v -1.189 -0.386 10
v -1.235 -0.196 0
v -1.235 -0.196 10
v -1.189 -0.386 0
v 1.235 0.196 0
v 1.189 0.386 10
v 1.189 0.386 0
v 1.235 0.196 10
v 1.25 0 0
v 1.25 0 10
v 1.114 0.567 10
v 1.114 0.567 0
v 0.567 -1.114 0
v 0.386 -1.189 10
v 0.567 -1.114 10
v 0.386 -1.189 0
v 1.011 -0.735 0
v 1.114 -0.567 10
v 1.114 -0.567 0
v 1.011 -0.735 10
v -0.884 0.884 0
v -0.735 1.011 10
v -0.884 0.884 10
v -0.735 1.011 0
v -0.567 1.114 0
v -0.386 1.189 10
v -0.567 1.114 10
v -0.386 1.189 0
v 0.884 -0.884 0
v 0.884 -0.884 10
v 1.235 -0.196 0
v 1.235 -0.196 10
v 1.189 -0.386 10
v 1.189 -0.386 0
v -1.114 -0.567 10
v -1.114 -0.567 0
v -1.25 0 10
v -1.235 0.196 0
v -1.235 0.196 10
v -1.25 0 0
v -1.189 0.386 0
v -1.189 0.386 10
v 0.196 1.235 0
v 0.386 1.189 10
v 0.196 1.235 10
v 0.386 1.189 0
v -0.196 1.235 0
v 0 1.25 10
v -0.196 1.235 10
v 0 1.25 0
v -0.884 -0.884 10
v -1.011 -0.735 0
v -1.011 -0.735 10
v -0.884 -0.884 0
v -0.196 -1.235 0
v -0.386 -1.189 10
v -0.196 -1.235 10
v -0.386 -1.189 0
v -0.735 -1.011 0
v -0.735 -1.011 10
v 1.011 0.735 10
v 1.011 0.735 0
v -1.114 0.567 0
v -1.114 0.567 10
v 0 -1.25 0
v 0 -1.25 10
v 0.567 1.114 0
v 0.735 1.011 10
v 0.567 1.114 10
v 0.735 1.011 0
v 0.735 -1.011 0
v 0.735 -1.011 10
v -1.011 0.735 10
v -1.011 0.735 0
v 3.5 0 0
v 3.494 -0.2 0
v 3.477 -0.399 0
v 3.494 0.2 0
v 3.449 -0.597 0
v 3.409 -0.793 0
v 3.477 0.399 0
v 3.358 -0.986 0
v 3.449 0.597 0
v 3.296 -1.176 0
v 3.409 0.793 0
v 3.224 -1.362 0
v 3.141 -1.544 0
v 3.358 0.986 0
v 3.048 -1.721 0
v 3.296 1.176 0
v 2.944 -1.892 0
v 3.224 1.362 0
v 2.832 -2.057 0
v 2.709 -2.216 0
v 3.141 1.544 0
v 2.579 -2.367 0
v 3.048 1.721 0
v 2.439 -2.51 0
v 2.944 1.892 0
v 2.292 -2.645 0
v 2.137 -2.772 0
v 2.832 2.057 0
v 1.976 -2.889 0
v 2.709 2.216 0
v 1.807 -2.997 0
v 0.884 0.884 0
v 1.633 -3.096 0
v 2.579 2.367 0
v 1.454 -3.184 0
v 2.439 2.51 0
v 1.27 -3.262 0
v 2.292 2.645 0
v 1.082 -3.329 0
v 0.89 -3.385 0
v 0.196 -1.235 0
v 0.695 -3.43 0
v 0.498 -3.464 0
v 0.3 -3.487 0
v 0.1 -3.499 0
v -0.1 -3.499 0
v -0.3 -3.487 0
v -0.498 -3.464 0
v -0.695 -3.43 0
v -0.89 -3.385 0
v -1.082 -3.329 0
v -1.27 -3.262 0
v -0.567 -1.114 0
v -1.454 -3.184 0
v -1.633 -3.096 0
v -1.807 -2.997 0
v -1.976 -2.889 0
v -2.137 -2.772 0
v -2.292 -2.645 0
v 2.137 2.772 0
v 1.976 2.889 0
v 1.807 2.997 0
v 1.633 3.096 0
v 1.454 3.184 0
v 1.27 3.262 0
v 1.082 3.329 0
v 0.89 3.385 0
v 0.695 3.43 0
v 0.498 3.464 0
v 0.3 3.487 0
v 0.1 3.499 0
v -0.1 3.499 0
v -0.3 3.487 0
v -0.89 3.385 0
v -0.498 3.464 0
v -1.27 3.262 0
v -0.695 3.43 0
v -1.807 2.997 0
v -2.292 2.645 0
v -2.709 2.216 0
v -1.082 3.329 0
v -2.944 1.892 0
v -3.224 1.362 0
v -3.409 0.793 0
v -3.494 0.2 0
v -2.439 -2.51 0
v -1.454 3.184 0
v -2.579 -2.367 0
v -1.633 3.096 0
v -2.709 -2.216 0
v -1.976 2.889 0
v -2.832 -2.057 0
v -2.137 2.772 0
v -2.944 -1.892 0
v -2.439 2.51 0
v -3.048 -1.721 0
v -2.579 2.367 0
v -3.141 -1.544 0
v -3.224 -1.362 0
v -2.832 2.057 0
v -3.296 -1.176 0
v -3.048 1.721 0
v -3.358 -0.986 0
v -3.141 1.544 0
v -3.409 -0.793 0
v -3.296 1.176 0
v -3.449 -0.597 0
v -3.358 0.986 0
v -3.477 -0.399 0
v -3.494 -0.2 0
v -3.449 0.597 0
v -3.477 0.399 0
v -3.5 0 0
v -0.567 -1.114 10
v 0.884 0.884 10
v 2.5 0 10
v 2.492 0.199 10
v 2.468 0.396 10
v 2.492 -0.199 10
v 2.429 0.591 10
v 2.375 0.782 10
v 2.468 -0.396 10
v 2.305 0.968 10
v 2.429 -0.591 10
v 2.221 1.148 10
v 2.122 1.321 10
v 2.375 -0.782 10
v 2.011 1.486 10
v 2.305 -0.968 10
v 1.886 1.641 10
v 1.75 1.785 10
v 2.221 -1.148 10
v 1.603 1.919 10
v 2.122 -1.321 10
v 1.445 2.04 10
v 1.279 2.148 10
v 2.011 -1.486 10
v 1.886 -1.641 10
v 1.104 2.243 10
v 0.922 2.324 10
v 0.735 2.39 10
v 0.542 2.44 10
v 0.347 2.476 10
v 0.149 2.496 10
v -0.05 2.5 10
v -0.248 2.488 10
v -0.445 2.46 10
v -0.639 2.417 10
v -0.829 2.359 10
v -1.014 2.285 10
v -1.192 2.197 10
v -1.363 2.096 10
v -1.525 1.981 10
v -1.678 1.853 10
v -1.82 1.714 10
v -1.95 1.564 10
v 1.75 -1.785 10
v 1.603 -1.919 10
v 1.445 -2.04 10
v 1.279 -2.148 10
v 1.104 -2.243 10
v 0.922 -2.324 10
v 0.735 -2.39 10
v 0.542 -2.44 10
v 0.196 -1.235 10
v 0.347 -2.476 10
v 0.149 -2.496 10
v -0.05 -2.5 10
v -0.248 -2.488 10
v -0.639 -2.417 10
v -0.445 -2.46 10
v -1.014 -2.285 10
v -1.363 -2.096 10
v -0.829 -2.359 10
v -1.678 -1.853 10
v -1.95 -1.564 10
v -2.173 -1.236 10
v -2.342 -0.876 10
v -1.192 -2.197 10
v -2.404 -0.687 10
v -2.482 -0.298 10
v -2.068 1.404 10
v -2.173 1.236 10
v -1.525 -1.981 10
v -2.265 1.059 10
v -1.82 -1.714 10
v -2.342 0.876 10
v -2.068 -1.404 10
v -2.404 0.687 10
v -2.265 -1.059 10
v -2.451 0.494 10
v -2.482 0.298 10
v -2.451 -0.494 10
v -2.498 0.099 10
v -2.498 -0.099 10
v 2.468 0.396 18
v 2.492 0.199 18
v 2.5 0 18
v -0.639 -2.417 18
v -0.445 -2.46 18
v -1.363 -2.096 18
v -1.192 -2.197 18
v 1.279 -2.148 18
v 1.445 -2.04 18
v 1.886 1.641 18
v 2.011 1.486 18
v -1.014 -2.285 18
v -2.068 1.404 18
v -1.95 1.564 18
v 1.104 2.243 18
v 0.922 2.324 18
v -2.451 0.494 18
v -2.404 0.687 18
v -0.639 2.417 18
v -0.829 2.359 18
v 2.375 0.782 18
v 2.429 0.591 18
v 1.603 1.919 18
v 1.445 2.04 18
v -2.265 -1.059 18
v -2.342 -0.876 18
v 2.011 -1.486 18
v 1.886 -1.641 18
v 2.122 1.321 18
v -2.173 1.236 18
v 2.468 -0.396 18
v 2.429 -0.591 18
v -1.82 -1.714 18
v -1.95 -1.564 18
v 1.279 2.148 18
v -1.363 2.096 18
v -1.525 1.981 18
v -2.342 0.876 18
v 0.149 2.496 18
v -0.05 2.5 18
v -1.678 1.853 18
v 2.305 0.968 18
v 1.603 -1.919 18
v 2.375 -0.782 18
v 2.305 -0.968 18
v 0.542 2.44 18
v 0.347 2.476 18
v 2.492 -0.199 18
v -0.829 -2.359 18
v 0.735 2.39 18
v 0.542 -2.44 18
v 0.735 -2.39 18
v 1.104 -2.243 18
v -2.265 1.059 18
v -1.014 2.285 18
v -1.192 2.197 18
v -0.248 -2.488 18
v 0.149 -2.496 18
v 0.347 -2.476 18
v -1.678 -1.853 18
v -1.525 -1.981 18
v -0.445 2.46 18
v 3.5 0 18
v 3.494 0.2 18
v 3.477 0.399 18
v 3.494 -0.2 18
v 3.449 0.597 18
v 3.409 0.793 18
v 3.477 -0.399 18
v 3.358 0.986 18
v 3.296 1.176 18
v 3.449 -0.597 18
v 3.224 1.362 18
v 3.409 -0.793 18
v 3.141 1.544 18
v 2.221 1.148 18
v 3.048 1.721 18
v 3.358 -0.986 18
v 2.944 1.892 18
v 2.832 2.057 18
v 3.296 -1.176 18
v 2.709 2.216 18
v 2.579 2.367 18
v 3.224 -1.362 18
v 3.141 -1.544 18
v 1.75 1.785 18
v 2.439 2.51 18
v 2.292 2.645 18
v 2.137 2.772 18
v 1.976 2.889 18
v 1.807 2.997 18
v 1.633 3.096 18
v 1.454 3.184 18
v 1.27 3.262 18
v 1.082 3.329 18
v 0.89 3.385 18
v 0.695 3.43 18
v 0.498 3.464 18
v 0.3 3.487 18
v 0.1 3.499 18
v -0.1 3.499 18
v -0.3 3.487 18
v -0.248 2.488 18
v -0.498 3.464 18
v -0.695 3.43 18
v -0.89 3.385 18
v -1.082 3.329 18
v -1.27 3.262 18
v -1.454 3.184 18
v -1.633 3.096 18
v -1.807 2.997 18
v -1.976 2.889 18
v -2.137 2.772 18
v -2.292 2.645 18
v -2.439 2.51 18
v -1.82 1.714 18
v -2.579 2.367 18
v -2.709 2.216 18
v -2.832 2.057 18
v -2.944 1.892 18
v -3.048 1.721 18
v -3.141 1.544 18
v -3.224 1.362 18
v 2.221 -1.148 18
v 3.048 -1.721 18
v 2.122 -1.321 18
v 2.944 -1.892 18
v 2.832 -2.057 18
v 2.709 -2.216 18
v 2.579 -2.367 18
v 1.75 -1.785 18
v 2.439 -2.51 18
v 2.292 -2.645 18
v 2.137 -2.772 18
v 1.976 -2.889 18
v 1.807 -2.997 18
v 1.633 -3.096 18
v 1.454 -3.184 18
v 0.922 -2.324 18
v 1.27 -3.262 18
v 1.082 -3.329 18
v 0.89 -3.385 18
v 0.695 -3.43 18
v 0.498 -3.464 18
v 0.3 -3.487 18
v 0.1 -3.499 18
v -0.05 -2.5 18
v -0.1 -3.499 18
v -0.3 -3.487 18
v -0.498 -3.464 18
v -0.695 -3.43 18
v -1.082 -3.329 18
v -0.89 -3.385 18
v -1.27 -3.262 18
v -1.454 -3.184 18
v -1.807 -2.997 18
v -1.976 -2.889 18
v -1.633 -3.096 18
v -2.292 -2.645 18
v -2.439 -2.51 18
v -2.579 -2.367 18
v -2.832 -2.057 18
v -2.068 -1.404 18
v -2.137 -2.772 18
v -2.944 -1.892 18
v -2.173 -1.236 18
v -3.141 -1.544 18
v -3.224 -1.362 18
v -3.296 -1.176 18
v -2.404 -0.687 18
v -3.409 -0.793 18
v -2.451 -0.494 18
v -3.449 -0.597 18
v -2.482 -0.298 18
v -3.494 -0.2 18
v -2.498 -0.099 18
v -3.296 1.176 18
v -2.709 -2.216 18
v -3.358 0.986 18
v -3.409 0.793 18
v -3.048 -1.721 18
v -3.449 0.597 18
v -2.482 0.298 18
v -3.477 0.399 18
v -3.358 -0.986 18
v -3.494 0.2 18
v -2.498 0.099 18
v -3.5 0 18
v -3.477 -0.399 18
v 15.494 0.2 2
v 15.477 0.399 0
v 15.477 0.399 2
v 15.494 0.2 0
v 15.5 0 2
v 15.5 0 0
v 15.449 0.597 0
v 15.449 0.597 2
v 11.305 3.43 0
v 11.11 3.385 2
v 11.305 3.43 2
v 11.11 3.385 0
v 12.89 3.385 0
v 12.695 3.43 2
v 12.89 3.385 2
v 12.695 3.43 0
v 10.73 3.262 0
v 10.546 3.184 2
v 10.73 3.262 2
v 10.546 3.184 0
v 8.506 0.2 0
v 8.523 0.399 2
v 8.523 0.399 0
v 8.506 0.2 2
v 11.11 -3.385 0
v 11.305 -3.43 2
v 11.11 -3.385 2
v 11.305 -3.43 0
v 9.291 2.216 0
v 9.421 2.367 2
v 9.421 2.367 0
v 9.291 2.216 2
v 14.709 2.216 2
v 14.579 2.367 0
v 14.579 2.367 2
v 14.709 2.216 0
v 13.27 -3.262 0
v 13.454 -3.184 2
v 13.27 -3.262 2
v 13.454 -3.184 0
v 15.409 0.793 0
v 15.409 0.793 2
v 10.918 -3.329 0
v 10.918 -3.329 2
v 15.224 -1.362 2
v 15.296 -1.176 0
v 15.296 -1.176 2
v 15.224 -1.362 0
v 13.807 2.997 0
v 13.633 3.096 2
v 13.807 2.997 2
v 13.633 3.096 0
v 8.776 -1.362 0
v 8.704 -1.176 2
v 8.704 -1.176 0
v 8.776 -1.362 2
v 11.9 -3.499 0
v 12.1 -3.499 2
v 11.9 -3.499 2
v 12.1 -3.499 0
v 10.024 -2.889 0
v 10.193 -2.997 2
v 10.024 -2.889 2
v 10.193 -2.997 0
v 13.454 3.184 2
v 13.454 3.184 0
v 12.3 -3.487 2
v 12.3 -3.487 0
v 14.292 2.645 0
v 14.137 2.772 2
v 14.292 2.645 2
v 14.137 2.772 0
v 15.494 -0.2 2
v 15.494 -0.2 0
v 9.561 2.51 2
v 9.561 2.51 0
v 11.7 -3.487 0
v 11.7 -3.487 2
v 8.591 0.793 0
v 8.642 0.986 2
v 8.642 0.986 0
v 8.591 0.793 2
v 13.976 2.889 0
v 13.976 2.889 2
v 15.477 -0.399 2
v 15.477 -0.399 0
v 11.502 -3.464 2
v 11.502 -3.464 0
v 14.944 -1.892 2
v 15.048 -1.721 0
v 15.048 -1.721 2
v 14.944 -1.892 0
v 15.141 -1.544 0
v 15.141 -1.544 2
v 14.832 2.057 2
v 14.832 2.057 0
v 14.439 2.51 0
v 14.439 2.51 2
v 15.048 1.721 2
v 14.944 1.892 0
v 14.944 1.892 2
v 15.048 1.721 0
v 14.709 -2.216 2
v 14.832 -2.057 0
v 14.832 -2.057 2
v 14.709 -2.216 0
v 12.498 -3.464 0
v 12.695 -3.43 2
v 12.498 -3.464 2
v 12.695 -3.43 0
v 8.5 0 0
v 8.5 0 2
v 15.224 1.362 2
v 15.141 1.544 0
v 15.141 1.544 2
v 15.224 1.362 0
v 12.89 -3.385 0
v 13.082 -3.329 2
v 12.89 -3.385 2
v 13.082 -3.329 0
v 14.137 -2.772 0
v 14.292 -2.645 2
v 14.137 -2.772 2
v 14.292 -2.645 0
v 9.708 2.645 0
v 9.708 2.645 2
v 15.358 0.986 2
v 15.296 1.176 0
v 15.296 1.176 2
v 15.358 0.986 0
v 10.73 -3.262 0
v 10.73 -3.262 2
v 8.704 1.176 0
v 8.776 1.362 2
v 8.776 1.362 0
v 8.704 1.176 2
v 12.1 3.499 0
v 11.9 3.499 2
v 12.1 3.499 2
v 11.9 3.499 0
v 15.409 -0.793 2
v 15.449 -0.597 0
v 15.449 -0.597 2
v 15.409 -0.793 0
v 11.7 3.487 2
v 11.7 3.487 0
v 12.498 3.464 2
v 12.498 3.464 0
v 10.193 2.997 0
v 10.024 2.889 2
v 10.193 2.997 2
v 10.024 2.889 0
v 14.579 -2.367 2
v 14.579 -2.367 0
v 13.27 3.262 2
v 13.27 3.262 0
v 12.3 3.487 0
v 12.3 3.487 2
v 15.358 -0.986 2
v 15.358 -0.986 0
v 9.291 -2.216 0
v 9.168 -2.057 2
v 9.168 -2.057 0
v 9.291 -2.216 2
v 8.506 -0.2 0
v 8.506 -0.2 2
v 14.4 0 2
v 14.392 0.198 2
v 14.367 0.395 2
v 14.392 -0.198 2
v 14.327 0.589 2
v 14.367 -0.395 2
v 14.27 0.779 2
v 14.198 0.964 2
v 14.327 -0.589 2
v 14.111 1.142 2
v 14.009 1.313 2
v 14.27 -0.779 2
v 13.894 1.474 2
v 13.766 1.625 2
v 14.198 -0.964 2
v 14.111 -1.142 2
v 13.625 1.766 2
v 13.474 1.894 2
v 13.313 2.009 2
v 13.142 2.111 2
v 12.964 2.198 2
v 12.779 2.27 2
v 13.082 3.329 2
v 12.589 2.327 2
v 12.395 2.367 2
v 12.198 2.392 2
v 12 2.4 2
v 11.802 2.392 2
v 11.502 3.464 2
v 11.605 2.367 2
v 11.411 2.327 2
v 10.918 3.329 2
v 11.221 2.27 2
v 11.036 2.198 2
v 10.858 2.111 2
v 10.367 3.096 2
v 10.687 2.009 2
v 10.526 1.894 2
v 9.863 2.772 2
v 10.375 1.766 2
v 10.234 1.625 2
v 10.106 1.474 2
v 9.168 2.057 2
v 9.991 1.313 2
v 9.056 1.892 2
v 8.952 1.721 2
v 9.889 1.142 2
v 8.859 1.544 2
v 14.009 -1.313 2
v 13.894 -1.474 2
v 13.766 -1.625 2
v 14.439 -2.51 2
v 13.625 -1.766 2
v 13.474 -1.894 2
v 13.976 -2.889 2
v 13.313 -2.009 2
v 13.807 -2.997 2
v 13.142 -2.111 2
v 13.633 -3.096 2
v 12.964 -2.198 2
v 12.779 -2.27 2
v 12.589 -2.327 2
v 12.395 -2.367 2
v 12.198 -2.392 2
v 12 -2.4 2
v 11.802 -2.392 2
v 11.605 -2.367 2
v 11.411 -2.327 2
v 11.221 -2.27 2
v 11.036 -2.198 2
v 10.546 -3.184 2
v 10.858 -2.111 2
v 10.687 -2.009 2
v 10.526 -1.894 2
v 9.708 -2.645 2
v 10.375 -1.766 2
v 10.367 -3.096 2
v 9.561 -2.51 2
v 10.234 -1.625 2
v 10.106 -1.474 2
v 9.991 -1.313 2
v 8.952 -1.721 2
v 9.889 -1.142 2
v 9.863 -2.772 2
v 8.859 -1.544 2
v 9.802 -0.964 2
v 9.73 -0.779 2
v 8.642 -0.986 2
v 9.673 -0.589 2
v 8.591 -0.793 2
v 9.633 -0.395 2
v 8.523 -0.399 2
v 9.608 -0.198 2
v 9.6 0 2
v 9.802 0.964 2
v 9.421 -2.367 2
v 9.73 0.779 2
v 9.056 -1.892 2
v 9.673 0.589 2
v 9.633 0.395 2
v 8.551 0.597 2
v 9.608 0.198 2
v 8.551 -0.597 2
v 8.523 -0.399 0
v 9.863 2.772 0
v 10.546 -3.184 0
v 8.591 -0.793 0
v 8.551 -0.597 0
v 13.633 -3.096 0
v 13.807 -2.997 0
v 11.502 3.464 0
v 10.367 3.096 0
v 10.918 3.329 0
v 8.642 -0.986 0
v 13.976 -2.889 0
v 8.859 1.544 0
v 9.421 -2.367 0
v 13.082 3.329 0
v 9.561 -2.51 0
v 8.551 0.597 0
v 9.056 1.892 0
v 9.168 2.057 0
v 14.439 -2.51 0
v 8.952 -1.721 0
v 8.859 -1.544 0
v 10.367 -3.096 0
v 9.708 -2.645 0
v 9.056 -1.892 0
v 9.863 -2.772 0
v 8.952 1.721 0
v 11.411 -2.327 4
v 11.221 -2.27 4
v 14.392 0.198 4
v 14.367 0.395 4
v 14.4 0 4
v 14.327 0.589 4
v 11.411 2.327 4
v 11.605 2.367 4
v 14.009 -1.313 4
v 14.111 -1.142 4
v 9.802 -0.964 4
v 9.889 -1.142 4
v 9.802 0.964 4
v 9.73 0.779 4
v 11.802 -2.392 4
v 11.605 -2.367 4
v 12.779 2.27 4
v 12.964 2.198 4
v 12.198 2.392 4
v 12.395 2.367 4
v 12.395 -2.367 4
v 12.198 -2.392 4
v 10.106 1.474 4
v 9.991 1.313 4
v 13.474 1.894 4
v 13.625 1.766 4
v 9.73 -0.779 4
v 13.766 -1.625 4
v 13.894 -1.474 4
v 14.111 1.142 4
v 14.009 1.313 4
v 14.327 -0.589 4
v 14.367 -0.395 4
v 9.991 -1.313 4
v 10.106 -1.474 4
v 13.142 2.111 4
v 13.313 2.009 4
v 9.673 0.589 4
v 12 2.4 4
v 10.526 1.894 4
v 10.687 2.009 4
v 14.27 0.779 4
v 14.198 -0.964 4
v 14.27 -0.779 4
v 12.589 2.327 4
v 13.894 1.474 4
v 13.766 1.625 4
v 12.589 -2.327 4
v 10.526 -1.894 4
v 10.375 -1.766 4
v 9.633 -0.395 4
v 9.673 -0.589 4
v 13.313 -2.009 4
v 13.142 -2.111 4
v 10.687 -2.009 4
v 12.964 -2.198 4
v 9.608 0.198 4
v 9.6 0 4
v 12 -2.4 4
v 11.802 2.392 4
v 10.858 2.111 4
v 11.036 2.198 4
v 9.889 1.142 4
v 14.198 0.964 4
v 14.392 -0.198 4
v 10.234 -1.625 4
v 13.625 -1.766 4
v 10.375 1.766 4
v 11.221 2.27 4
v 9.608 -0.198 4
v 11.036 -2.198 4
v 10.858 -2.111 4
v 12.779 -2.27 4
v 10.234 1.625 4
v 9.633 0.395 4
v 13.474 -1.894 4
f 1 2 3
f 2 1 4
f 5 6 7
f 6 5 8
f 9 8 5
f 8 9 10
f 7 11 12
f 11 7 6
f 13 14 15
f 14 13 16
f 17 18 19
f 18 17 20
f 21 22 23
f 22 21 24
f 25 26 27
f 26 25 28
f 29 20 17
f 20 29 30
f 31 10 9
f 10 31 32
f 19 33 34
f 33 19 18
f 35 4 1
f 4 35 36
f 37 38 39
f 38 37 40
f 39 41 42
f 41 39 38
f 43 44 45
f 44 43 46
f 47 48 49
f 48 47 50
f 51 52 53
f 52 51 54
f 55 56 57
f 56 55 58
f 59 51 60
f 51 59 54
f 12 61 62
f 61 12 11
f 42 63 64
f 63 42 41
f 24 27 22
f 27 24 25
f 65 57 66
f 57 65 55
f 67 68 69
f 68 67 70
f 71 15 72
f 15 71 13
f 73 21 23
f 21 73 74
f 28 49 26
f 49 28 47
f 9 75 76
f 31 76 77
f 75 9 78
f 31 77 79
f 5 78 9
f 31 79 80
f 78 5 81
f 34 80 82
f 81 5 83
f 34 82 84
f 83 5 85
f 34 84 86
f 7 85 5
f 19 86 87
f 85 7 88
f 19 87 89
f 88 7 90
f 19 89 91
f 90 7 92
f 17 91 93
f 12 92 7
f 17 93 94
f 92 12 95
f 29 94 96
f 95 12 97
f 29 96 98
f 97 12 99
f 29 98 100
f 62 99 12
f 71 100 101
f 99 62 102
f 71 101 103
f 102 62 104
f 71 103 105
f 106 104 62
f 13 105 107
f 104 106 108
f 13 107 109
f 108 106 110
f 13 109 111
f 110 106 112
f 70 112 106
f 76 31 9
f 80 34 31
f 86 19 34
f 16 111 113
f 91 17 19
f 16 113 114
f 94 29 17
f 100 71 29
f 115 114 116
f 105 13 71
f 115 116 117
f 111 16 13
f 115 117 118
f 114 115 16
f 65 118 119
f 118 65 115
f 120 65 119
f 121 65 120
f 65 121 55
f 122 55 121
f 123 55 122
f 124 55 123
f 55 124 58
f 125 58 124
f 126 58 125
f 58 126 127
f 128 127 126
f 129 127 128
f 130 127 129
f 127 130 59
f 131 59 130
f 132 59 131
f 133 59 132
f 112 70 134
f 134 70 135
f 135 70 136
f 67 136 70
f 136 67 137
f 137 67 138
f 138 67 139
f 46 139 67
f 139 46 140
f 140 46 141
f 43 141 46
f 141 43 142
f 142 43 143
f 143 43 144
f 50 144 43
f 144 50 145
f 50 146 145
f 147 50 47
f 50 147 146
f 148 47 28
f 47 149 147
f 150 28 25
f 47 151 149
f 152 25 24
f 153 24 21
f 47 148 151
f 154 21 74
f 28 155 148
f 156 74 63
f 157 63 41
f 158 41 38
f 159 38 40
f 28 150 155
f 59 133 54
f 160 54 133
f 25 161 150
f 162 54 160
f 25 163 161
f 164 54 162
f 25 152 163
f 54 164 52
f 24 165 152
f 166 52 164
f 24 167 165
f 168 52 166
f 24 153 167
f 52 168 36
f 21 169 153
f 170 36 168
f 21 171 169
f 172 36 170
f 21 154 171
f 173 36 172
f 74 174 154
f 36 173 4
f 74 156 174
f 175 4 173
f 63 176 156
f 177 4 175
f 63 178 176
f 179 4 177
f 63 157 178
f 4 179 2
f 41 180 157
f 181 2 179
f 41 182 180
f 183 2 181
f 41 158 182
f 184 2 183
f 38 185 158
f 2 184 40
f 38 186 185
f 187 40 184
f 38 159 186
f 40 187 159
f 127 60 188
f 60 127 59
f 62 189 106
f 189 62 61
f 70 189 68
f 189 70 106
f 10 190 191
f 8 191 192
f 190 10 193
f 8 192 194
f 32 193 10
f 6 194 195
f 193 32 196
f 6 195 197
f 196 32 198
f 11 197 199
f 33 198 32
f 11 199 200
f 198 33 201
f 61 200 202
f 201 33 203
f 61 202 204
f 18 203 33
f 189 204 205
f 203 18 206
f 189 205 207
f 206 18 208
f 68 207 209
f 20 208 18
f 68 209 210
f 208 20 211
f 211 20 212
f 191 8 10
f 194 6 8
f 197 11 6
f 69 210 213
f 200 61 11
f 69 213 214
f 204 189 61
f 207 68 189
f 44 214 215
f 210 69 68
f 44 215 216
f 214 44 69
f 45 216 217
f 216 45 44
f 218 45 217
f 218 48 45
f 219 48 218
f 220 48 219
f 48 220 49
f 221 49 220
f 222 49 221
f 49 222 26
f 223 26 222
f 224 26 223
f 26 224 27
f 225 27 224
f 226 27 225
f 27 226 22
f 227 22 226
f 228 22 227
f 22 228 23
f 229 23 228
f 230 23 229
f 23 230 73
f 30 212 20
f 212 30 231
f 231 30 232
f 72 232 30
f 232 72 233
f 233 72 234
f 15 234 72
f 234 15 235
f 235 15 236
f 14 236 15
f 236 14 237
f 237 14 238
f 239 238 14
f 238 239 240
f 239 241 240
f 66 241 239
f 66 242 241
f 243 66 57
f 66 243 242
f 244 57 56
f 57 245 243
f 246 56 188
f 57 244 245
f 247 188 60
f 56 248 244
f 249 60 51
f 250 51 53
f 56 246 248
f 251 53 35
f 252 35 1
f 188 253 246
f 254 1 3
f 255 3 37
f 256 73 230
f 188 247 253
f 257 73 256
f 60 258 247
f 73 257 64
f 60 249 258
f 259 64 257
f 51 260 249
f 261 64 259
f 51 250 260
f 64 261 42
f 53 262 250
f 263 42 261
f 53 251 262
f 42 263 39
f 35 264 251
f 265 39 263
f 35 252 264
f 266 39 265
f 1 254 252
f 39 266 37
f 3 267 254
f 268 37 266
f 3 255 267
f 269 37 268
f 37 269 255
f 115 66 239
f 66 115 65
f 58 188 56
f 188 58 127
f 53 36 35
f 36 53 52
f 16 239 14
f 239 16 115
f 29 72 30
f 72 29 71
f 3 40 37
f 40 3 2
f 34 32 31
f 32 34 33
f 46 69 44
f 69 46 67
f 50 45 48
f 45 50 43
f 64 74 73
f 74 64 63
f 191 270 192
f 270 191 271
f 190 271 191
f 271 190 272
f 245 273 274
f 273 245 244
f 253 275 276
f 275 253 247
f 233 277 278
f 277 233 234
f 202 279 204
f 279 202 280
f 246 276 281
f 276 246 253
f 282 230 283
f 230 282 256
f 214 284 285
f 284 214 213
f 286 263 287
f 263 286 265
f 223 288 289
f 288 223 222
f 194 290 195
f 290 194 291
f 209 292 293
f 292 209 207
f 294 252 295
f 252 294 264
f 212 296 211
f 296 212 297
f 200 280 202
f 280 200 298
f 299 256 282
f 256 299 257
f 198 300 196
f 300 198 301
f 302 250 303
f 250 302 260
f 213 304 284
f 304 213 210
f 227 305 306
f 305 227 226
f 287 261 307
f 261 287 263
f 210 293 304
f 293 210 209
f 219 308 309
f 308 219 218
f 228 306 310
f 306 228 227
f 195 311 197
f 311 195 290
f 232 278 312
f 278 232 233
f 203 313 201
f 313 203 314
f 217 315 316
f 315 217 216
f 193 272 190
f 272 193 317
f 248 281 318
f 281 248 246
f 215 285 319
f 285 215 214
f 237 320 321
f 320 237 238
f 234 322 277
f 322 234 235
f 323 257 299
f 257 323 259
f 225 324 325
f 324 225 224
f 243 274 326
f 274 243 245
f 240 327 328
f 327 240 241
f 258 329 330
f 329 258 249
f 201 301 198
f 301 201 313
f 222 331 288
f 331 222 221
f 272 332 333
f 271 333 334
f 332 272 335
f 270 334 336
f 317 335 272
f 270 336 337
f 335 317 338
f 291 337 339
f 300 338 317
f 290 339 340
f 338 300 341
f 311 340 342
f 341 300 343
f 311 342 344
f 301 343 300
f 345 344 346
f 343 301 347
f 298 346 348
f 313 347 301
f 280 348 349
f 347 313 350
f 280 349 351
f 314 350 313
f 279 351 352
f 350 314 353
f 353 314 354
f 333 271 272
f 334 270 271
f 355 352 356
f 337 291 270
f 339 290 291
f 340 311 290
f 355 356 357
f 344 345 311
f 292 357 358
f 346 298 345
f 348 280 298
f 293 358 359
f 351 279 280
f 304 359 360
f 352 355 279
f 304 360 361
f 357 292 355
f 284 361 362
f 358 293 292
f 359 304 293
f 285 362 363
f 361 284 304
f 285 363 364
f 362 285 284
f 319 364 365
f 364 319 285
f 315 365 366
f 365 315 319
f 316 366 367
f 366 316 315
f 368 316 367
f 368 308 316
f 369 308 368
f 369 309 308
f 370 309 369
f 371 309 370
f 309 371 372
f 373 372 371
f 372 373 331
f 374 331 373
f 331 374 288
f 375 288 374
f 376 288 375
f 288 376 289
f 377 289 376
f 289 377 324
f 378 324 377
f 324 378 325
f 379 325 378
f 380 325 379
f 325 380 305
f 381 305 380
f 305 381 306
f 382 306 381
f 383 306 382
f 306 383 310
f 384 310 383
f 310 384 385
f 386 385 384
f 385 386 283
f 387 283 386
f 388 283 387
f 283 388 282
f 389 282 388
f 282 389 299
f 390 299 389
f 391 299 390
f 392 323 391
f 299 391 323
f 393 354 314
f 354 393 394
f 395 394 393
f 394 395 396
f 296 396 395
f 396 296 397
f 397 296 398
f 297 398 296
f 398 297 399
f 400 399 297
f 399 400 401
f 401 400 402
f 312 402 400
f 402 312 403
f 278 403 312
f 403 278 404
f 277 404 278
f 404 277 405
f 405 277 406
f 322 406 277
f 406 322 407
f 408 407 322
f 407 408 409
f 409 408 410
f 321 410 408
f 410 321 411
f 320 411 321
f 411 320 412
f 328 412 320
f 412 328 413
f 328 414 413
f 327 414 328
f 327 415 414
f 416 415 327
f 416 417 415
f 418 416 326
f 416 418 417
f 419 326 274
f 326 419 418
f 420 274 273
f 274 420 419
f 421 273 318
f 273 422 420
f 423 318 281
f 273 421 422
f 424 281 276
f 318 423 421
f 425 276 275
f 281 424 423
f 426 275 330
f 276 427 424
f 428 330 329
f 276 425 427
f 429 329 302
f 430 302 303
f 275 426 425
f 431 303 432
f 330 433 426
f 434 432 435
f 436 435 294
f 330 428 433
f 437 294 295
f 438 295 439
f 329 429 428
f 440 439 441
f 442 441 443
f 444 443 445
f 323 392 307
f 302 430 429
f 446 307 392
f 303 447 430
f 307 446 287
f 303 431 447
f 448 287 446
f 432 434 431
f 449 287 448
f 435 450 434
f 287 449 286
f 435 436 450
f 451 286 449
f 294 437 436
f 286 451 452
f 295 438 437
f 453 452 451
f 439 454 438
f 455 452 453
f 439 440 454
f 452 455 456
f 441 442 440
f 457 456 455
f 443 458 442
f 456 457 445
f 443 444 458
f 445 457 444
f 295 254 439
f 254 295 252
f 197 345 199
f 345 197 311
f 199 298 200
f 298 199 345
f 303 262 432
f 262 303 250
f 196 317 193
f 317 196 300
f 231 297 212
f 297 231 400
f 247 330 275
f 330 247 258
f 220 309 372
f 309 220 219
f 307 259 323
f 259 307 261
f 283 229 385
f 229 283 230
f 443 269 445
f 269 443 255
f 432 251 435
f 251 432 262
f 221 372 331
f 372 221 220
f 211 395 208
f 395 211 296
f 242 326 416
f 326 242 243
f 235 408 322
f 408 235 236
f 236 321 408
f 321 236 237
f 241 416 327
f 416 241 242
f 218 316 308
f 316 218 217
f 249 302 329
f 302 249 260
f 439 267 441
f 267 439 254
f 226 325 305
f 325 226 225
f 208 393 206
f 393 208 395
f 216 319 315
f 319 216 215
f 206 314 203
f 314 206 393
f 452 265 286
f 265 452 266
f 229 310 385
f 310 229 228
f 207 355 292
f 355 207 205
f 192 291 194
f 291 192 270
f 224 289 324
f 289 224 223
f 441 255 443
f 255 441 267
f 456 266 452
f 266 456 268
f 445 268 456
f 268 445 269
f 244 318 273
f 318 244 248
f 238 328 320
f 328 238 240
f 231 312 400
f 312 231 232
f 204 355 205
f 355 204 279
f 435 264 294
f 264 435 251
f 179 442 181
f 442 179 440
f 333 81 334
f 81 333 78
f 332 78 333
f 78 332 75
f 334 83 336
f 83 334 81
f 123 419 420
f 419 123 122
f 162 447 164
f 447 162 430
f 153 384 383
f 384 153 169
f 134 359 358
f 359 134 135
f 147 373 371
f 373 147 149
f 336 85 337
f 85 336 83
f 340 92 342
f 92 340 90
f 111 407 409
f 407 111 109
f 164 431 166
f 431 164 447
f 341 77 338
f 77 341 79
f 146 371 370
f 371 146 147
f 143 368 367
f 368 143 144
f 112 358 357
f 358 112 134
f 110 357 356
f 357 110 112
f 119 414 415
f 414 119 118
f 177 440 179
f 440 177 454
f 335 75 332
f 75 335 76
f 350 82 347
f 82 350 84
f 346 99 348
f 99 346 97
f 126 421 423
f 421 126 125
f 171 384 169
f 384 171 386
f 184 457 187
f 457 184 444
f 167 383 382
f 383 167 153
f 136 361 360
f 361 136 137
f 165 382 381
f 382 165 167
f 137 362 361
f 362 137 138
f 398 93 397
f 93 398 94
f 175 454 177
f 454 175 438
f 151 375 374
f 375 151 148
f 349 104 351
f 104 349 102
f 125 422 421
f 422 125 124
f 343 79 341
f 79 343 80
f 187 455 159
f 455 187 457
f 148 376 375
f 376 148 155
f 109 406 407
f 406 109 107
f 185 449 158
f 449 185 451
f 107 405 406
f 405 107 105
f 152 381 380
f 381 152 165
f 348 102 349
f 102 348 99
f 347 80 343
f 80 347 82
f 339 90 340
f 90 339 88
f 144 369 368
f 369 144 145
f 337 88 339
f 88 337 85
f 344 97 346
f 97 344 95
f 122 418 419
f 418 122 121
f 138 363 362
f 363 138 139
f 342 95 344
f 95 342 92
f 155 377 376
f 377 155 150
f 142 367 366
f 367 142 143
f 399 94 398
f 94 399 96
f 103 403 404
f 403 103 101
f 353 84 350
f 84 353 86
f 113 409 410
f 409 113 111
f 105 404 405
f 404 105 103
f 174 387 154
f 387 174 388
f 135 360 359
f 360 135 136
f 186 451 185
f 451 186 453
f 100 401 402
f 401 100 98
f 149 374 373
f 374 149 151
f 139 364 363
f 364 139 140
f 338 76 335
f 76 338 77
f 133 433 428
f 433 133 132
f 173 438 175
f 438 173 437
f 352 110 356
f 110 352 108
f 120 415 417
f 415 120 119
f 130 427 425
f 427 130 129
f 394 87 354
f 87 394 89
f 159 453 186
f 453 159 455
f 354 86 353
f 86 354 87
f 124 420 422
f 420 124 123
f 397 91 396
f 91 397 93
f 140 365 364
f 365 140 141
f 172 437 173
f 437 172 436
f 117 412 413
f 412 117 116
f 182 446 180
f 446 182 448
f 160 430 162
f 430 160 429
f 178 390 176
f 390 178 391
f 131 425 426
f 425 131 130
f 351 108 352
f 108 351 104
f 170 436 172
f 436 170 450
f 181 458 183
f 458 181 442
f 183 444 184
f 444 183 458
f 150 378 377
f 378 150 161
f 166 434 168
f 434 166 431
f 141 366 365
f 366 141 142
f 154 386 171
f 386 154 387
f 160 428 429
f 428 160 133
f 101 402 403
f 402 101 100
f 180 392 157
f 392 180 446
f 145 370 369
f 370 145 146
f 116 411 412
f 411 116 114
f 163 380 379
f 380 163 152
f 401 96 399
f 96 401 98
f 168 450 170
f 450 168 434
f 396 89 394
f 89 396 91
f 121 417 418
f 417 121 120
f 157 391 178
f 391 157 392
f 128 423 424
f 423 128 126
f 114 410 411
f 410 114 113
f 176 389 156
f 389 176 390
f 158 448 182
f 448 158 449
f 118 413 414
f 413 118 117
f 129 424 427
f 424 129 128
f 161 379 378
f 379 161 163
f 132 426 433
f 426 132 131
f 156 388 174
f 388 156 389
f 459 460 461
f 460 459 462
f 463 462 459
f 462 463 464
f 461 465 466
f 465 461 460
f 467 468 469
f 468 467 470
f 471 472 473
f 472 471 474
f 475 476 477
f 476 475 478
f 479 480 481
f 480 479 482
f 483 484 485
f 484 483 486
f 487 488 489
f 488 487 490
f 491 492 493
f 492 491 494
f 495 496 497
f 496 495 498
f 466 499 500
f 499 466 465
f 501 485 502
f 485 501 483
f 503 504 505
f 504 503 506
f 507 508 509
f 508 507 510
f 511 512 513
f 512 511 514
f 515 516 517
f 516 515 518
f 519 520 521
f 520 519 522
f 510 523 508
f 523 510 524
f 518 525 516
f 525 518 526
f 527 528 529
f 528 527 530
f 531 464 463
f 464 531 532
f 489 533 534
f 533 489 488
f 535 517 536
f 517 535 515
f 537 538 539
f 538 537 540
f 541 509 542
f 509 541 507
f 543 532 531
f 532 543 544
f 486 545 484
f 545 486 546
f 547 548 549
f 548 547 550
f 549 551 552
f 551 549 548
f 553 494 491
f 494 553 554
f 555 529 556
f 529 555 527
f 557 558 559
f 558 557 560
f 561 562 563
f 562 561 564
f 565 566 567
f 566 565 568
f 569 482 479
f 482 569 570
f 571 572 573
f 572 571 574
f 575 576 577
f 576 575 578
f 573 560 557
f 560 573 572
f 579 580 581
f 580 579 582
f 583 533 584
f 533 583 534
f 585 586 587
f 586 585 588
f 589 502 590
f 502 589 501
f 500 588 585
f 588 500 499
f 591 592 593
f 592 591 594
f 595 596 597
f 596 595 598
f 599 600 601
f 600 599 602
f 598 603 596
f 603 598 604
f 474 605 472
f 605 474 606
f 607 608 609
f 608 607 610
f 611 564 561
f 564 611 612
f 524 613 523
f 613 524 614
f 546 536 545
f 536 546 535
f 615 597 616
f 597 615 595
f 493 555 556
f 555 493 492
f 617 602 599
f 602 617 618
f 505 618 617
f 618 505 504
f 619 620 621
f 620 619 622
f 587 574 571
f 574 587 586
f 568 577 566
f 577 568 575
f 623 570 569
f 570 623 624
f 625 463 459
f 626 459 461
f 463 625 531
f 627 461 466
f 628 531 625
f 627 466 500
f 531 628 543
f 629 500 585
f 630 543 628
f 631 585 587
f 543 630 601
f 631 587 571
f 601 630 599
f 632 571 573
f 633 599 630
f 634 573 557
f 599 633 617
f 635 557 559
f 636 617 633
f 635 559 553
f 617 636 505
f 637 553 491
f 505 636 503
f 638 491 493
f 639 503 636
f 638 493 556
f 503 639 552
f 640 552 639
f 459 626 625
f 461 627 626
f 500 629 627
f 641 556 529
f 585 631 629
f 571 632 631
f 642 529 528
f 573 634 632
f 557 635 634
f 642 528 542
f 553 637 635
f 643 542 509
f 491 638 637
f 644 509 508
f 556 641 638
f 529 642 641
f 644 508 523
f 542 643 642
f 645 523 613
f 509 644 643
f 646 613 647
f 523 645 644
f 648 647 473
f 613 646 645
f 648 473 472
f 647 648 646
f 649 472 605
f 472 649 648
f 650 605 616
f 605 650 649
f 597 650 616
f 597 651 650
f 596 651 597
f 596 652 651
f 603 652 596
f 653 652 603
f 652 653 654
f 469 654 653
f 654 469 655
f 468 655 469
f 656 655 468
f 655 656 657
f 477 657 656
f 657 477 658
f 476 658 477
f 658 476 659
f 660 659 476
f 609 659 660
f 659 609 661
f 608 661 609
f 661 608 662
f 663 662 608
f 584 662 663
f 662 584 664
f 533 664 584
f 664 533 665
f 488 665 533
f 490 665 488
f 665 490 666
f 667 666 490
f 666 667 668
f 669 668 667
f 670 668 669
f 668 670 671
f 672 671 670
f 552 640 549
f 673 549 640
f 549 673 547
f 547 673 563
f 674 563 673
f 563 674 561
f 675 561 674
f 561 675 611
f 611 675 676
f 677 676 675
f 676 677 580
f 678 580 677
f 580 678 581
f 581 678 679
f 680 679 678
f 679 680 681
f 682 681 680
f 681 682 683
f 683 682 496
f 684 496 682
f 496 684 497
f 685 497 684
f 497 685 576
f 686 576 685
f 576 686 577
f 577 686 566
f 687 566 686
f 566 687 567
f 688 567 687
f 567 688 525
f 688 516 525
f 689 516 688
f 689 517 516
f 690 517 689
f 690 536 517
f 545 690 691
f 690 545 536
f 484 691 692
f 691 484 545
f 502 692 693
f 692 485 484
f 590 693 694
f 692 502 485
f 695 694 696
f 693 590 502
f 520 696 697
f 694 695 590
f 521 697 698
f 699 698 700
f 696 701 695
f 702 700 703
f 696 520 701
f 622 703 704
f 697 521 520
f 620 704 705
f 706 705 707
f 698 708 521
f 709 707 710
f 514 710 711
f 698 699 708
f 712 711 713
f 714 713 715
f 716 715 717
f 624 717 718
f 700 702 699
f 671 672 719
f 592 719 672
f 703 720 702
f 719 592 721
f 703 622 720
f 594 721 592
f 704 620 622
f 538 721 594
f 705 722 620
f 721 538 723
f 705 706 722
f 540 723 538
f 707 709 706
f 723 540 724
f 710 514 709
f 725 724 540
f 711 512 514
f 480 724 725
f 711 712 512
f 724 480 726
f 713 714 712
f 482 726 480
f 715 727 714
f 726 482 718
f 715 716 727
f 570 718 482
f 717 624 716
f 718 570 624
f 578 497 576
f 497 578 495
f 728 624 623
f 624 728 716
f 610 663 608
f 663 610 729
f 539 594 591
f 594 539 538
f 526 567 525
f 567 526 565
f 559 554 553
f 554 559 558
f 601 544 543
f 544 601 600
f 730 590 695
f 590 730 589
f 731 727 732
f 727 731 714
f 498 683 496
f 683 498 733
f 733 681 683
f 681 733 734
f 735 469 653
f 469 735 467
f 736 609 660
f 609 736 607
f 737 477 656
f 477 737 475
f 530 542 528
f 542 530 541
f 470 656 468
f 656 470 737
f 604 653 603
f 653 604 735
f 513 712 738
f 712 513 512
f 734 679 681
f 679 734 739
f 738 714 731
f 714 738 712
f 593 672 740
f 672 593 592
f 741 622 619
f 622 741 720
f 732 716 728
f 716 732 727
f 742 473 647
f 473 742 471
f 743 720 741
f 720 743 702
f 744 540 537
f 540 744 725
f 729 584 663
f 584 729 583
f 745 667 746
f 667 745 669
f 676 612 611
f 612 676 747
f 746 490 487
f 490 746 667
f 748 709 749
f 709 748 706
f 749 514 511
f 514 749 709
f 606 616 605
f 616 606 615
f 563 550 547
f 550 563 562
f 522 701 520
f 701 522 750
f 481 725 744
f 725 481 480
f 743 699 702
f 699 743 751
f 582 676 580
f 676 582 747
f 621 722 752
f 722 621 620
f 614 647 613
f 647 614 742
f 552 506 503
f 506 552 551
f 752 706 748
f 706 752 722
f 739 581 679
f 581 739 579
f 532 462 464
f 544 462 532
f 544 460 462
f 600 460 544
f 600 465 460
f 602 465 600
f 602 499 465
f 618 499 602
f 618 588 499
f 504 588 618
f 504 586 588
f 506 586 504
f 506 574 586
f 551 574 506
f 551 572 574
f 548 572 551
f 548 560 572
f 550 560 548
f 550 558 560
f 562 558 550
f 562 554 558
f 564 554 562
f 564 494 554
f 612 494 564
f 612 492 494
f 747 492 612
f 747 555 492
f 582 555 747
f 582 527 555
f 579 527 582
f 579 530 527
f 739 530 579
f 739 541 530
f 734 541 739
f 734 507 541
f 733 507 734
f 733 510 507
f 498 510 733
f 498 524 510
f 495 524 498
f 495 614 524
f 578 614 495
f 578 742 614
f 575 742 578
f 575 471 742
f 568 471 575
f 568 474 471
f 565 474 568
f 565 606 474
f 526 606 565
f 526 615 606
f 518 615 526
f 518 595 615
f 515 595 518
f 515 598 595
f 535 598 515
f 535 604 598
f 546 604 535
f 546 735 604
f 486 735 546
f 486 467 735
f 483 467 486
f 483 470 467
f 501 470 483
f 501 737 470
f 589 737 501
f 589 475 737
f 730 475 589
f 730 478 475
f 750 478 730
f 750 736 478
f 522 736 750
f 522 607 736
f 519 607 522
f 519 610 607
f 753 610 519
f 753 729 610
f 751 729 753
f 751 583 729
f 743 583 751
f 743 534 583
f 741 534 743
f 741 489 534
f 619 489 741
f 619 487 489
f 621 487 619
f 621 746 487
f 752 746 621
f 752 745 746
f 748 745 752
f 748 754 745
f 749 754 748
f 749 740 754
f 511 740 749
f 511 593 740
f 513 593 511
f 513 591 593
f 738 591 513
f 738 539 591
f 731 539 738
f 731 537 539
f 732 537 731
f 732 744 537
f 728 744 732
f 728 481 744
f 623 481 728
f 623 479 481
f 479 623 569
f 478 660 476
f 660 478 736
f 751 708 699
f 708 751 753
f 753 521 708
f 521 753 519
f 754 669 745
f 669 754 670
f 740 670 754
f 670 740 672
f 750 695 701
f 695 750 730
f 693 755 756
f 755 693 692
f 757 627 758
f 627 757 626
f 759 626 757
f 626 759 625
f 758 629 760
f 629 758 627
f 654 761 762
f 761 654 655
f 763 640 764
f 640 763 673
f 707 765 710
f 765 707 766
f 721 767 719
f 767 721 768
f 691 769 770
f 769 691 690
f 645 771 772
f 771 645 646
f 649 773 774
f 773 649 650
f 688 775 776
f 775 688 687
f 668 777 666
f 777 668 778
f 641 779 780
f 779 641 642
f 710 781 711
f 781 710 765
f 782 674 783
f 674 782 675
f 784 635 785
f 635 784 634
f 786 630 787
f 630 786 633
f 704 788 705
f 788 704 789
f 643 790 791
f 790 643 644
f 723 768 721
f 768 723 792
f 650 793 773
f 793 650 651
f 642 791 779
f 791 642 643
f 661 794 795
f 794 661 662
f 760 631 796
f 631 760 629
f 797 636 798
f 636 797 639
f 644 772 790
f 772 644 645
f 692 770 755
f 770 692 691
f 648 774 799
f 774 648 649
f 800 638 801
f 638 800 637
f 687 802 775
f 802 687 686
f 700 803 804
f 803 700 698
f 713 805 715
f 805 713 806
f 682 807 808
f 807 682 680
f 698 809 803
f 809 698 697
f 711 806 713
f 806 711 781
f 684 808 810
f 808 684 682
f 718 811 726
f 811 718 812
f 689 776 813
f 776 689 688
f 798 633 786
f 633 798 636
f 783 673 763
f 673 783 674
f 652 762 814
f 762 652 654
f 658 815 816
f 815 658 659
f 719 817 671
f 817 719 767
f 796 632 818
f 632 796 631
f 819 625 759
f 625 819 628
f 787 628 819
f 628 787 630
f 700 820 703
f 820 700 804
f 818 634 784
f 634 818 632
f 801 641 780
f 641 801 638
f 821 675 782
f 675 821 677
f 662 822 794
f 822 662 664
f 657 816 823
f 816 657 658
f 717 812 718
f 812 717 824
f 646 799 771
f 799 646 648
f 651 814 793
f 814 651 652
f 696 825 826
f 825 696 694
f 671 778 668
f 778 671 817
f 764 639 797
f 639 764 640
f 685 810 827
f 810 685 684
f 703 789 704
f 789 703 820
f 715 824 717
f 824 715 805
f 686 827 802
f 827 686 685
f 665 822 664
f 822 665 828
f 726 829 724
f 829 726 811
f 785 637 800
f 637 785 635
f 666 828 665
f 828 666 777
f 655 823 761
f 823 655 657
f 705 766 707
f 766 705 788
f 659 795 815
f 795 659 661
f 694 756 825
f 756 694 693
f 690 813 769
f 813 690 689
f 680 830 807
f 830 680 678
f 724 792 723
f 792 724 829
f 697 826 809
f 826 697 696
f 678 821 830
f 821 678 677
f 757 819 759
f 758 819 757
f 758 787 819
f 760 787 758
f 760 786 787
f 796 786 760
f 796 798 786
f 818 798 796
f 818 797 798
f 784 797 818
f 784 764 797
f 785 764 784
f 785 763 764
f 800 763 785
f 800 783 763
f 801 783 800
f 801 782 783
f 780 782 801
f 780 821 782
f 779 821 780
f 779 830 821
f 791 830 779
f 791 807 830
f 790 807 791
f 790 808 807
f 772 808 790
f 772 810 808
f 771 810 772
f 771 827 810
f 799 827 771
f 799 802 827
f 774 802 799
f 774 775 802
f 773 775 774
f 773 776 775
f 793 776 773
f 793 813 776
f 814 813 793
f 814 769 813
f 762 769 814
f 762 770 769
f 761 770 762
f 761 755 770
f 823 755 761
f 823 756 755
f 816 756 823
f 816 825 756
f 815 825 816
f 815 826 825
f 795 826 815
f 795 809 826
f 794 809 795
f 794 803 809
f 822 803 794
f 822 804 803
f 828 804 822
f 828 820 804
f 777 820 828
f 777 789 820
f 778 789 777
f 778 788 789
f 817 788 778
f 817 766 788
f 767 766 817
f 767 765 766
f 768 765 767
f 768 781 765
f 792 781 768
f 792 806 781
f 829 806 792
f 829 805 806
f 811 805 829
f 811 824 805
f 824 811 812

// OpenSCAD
/* 
    Cord Switch Tip by dector (https://www.thingiverse.com/thing:3172373)

    This version is optimized for Thingiverse Customizer.
    For full sources and latest version checkout github repository:

    https://github.com/dector/things/tree/master/CordSwitchTip
*/

tipLength = 20;
tipDiameter = 7;

ropeWidth = 2.5;

capGap = 0.2;
tubeBigHoleDiameter = tipDiameter - 2;

capBigDiameter = tipDiameter;
capBigHeight = 2;
capSmallDiameter = tubeBigHoleDiameter - capGap;
capSmallHeight = 2;

tubeLength = tipLength - capBigHeight;
tubeDiameter = tipDiameter;
tubeBigHoleLength = 8;
tubeSmallHoleLength = tubeLength - tubeBigHoleLength;
tubeSmallHoleDiameter = ropeWidth;

$fa = 1;
$fs = 0.2;

// Tube
{
    difference() {
        cylinder(d = tubeDiameter, h = tubeLength);
        
        union() {
            cylinder(d = tubeSmallHoleDiameter, h = tubeSmallHoleLength);
            
            translate([0, 0, tubeSmallHoleLength]) cylinder(d = tubeBigHoleDiameter, h = tubeBigHoleLength);
        }
    }
}

// Cap
translate([tubeDiameter + 5, 0, 0]) {
    cylinder(d = capBigDiameter, h = capBigHeight);

    translate([0, 0, capBigHeight])
    cylinder(d = capSmallDiameter, h = capSmallHeight);
}
